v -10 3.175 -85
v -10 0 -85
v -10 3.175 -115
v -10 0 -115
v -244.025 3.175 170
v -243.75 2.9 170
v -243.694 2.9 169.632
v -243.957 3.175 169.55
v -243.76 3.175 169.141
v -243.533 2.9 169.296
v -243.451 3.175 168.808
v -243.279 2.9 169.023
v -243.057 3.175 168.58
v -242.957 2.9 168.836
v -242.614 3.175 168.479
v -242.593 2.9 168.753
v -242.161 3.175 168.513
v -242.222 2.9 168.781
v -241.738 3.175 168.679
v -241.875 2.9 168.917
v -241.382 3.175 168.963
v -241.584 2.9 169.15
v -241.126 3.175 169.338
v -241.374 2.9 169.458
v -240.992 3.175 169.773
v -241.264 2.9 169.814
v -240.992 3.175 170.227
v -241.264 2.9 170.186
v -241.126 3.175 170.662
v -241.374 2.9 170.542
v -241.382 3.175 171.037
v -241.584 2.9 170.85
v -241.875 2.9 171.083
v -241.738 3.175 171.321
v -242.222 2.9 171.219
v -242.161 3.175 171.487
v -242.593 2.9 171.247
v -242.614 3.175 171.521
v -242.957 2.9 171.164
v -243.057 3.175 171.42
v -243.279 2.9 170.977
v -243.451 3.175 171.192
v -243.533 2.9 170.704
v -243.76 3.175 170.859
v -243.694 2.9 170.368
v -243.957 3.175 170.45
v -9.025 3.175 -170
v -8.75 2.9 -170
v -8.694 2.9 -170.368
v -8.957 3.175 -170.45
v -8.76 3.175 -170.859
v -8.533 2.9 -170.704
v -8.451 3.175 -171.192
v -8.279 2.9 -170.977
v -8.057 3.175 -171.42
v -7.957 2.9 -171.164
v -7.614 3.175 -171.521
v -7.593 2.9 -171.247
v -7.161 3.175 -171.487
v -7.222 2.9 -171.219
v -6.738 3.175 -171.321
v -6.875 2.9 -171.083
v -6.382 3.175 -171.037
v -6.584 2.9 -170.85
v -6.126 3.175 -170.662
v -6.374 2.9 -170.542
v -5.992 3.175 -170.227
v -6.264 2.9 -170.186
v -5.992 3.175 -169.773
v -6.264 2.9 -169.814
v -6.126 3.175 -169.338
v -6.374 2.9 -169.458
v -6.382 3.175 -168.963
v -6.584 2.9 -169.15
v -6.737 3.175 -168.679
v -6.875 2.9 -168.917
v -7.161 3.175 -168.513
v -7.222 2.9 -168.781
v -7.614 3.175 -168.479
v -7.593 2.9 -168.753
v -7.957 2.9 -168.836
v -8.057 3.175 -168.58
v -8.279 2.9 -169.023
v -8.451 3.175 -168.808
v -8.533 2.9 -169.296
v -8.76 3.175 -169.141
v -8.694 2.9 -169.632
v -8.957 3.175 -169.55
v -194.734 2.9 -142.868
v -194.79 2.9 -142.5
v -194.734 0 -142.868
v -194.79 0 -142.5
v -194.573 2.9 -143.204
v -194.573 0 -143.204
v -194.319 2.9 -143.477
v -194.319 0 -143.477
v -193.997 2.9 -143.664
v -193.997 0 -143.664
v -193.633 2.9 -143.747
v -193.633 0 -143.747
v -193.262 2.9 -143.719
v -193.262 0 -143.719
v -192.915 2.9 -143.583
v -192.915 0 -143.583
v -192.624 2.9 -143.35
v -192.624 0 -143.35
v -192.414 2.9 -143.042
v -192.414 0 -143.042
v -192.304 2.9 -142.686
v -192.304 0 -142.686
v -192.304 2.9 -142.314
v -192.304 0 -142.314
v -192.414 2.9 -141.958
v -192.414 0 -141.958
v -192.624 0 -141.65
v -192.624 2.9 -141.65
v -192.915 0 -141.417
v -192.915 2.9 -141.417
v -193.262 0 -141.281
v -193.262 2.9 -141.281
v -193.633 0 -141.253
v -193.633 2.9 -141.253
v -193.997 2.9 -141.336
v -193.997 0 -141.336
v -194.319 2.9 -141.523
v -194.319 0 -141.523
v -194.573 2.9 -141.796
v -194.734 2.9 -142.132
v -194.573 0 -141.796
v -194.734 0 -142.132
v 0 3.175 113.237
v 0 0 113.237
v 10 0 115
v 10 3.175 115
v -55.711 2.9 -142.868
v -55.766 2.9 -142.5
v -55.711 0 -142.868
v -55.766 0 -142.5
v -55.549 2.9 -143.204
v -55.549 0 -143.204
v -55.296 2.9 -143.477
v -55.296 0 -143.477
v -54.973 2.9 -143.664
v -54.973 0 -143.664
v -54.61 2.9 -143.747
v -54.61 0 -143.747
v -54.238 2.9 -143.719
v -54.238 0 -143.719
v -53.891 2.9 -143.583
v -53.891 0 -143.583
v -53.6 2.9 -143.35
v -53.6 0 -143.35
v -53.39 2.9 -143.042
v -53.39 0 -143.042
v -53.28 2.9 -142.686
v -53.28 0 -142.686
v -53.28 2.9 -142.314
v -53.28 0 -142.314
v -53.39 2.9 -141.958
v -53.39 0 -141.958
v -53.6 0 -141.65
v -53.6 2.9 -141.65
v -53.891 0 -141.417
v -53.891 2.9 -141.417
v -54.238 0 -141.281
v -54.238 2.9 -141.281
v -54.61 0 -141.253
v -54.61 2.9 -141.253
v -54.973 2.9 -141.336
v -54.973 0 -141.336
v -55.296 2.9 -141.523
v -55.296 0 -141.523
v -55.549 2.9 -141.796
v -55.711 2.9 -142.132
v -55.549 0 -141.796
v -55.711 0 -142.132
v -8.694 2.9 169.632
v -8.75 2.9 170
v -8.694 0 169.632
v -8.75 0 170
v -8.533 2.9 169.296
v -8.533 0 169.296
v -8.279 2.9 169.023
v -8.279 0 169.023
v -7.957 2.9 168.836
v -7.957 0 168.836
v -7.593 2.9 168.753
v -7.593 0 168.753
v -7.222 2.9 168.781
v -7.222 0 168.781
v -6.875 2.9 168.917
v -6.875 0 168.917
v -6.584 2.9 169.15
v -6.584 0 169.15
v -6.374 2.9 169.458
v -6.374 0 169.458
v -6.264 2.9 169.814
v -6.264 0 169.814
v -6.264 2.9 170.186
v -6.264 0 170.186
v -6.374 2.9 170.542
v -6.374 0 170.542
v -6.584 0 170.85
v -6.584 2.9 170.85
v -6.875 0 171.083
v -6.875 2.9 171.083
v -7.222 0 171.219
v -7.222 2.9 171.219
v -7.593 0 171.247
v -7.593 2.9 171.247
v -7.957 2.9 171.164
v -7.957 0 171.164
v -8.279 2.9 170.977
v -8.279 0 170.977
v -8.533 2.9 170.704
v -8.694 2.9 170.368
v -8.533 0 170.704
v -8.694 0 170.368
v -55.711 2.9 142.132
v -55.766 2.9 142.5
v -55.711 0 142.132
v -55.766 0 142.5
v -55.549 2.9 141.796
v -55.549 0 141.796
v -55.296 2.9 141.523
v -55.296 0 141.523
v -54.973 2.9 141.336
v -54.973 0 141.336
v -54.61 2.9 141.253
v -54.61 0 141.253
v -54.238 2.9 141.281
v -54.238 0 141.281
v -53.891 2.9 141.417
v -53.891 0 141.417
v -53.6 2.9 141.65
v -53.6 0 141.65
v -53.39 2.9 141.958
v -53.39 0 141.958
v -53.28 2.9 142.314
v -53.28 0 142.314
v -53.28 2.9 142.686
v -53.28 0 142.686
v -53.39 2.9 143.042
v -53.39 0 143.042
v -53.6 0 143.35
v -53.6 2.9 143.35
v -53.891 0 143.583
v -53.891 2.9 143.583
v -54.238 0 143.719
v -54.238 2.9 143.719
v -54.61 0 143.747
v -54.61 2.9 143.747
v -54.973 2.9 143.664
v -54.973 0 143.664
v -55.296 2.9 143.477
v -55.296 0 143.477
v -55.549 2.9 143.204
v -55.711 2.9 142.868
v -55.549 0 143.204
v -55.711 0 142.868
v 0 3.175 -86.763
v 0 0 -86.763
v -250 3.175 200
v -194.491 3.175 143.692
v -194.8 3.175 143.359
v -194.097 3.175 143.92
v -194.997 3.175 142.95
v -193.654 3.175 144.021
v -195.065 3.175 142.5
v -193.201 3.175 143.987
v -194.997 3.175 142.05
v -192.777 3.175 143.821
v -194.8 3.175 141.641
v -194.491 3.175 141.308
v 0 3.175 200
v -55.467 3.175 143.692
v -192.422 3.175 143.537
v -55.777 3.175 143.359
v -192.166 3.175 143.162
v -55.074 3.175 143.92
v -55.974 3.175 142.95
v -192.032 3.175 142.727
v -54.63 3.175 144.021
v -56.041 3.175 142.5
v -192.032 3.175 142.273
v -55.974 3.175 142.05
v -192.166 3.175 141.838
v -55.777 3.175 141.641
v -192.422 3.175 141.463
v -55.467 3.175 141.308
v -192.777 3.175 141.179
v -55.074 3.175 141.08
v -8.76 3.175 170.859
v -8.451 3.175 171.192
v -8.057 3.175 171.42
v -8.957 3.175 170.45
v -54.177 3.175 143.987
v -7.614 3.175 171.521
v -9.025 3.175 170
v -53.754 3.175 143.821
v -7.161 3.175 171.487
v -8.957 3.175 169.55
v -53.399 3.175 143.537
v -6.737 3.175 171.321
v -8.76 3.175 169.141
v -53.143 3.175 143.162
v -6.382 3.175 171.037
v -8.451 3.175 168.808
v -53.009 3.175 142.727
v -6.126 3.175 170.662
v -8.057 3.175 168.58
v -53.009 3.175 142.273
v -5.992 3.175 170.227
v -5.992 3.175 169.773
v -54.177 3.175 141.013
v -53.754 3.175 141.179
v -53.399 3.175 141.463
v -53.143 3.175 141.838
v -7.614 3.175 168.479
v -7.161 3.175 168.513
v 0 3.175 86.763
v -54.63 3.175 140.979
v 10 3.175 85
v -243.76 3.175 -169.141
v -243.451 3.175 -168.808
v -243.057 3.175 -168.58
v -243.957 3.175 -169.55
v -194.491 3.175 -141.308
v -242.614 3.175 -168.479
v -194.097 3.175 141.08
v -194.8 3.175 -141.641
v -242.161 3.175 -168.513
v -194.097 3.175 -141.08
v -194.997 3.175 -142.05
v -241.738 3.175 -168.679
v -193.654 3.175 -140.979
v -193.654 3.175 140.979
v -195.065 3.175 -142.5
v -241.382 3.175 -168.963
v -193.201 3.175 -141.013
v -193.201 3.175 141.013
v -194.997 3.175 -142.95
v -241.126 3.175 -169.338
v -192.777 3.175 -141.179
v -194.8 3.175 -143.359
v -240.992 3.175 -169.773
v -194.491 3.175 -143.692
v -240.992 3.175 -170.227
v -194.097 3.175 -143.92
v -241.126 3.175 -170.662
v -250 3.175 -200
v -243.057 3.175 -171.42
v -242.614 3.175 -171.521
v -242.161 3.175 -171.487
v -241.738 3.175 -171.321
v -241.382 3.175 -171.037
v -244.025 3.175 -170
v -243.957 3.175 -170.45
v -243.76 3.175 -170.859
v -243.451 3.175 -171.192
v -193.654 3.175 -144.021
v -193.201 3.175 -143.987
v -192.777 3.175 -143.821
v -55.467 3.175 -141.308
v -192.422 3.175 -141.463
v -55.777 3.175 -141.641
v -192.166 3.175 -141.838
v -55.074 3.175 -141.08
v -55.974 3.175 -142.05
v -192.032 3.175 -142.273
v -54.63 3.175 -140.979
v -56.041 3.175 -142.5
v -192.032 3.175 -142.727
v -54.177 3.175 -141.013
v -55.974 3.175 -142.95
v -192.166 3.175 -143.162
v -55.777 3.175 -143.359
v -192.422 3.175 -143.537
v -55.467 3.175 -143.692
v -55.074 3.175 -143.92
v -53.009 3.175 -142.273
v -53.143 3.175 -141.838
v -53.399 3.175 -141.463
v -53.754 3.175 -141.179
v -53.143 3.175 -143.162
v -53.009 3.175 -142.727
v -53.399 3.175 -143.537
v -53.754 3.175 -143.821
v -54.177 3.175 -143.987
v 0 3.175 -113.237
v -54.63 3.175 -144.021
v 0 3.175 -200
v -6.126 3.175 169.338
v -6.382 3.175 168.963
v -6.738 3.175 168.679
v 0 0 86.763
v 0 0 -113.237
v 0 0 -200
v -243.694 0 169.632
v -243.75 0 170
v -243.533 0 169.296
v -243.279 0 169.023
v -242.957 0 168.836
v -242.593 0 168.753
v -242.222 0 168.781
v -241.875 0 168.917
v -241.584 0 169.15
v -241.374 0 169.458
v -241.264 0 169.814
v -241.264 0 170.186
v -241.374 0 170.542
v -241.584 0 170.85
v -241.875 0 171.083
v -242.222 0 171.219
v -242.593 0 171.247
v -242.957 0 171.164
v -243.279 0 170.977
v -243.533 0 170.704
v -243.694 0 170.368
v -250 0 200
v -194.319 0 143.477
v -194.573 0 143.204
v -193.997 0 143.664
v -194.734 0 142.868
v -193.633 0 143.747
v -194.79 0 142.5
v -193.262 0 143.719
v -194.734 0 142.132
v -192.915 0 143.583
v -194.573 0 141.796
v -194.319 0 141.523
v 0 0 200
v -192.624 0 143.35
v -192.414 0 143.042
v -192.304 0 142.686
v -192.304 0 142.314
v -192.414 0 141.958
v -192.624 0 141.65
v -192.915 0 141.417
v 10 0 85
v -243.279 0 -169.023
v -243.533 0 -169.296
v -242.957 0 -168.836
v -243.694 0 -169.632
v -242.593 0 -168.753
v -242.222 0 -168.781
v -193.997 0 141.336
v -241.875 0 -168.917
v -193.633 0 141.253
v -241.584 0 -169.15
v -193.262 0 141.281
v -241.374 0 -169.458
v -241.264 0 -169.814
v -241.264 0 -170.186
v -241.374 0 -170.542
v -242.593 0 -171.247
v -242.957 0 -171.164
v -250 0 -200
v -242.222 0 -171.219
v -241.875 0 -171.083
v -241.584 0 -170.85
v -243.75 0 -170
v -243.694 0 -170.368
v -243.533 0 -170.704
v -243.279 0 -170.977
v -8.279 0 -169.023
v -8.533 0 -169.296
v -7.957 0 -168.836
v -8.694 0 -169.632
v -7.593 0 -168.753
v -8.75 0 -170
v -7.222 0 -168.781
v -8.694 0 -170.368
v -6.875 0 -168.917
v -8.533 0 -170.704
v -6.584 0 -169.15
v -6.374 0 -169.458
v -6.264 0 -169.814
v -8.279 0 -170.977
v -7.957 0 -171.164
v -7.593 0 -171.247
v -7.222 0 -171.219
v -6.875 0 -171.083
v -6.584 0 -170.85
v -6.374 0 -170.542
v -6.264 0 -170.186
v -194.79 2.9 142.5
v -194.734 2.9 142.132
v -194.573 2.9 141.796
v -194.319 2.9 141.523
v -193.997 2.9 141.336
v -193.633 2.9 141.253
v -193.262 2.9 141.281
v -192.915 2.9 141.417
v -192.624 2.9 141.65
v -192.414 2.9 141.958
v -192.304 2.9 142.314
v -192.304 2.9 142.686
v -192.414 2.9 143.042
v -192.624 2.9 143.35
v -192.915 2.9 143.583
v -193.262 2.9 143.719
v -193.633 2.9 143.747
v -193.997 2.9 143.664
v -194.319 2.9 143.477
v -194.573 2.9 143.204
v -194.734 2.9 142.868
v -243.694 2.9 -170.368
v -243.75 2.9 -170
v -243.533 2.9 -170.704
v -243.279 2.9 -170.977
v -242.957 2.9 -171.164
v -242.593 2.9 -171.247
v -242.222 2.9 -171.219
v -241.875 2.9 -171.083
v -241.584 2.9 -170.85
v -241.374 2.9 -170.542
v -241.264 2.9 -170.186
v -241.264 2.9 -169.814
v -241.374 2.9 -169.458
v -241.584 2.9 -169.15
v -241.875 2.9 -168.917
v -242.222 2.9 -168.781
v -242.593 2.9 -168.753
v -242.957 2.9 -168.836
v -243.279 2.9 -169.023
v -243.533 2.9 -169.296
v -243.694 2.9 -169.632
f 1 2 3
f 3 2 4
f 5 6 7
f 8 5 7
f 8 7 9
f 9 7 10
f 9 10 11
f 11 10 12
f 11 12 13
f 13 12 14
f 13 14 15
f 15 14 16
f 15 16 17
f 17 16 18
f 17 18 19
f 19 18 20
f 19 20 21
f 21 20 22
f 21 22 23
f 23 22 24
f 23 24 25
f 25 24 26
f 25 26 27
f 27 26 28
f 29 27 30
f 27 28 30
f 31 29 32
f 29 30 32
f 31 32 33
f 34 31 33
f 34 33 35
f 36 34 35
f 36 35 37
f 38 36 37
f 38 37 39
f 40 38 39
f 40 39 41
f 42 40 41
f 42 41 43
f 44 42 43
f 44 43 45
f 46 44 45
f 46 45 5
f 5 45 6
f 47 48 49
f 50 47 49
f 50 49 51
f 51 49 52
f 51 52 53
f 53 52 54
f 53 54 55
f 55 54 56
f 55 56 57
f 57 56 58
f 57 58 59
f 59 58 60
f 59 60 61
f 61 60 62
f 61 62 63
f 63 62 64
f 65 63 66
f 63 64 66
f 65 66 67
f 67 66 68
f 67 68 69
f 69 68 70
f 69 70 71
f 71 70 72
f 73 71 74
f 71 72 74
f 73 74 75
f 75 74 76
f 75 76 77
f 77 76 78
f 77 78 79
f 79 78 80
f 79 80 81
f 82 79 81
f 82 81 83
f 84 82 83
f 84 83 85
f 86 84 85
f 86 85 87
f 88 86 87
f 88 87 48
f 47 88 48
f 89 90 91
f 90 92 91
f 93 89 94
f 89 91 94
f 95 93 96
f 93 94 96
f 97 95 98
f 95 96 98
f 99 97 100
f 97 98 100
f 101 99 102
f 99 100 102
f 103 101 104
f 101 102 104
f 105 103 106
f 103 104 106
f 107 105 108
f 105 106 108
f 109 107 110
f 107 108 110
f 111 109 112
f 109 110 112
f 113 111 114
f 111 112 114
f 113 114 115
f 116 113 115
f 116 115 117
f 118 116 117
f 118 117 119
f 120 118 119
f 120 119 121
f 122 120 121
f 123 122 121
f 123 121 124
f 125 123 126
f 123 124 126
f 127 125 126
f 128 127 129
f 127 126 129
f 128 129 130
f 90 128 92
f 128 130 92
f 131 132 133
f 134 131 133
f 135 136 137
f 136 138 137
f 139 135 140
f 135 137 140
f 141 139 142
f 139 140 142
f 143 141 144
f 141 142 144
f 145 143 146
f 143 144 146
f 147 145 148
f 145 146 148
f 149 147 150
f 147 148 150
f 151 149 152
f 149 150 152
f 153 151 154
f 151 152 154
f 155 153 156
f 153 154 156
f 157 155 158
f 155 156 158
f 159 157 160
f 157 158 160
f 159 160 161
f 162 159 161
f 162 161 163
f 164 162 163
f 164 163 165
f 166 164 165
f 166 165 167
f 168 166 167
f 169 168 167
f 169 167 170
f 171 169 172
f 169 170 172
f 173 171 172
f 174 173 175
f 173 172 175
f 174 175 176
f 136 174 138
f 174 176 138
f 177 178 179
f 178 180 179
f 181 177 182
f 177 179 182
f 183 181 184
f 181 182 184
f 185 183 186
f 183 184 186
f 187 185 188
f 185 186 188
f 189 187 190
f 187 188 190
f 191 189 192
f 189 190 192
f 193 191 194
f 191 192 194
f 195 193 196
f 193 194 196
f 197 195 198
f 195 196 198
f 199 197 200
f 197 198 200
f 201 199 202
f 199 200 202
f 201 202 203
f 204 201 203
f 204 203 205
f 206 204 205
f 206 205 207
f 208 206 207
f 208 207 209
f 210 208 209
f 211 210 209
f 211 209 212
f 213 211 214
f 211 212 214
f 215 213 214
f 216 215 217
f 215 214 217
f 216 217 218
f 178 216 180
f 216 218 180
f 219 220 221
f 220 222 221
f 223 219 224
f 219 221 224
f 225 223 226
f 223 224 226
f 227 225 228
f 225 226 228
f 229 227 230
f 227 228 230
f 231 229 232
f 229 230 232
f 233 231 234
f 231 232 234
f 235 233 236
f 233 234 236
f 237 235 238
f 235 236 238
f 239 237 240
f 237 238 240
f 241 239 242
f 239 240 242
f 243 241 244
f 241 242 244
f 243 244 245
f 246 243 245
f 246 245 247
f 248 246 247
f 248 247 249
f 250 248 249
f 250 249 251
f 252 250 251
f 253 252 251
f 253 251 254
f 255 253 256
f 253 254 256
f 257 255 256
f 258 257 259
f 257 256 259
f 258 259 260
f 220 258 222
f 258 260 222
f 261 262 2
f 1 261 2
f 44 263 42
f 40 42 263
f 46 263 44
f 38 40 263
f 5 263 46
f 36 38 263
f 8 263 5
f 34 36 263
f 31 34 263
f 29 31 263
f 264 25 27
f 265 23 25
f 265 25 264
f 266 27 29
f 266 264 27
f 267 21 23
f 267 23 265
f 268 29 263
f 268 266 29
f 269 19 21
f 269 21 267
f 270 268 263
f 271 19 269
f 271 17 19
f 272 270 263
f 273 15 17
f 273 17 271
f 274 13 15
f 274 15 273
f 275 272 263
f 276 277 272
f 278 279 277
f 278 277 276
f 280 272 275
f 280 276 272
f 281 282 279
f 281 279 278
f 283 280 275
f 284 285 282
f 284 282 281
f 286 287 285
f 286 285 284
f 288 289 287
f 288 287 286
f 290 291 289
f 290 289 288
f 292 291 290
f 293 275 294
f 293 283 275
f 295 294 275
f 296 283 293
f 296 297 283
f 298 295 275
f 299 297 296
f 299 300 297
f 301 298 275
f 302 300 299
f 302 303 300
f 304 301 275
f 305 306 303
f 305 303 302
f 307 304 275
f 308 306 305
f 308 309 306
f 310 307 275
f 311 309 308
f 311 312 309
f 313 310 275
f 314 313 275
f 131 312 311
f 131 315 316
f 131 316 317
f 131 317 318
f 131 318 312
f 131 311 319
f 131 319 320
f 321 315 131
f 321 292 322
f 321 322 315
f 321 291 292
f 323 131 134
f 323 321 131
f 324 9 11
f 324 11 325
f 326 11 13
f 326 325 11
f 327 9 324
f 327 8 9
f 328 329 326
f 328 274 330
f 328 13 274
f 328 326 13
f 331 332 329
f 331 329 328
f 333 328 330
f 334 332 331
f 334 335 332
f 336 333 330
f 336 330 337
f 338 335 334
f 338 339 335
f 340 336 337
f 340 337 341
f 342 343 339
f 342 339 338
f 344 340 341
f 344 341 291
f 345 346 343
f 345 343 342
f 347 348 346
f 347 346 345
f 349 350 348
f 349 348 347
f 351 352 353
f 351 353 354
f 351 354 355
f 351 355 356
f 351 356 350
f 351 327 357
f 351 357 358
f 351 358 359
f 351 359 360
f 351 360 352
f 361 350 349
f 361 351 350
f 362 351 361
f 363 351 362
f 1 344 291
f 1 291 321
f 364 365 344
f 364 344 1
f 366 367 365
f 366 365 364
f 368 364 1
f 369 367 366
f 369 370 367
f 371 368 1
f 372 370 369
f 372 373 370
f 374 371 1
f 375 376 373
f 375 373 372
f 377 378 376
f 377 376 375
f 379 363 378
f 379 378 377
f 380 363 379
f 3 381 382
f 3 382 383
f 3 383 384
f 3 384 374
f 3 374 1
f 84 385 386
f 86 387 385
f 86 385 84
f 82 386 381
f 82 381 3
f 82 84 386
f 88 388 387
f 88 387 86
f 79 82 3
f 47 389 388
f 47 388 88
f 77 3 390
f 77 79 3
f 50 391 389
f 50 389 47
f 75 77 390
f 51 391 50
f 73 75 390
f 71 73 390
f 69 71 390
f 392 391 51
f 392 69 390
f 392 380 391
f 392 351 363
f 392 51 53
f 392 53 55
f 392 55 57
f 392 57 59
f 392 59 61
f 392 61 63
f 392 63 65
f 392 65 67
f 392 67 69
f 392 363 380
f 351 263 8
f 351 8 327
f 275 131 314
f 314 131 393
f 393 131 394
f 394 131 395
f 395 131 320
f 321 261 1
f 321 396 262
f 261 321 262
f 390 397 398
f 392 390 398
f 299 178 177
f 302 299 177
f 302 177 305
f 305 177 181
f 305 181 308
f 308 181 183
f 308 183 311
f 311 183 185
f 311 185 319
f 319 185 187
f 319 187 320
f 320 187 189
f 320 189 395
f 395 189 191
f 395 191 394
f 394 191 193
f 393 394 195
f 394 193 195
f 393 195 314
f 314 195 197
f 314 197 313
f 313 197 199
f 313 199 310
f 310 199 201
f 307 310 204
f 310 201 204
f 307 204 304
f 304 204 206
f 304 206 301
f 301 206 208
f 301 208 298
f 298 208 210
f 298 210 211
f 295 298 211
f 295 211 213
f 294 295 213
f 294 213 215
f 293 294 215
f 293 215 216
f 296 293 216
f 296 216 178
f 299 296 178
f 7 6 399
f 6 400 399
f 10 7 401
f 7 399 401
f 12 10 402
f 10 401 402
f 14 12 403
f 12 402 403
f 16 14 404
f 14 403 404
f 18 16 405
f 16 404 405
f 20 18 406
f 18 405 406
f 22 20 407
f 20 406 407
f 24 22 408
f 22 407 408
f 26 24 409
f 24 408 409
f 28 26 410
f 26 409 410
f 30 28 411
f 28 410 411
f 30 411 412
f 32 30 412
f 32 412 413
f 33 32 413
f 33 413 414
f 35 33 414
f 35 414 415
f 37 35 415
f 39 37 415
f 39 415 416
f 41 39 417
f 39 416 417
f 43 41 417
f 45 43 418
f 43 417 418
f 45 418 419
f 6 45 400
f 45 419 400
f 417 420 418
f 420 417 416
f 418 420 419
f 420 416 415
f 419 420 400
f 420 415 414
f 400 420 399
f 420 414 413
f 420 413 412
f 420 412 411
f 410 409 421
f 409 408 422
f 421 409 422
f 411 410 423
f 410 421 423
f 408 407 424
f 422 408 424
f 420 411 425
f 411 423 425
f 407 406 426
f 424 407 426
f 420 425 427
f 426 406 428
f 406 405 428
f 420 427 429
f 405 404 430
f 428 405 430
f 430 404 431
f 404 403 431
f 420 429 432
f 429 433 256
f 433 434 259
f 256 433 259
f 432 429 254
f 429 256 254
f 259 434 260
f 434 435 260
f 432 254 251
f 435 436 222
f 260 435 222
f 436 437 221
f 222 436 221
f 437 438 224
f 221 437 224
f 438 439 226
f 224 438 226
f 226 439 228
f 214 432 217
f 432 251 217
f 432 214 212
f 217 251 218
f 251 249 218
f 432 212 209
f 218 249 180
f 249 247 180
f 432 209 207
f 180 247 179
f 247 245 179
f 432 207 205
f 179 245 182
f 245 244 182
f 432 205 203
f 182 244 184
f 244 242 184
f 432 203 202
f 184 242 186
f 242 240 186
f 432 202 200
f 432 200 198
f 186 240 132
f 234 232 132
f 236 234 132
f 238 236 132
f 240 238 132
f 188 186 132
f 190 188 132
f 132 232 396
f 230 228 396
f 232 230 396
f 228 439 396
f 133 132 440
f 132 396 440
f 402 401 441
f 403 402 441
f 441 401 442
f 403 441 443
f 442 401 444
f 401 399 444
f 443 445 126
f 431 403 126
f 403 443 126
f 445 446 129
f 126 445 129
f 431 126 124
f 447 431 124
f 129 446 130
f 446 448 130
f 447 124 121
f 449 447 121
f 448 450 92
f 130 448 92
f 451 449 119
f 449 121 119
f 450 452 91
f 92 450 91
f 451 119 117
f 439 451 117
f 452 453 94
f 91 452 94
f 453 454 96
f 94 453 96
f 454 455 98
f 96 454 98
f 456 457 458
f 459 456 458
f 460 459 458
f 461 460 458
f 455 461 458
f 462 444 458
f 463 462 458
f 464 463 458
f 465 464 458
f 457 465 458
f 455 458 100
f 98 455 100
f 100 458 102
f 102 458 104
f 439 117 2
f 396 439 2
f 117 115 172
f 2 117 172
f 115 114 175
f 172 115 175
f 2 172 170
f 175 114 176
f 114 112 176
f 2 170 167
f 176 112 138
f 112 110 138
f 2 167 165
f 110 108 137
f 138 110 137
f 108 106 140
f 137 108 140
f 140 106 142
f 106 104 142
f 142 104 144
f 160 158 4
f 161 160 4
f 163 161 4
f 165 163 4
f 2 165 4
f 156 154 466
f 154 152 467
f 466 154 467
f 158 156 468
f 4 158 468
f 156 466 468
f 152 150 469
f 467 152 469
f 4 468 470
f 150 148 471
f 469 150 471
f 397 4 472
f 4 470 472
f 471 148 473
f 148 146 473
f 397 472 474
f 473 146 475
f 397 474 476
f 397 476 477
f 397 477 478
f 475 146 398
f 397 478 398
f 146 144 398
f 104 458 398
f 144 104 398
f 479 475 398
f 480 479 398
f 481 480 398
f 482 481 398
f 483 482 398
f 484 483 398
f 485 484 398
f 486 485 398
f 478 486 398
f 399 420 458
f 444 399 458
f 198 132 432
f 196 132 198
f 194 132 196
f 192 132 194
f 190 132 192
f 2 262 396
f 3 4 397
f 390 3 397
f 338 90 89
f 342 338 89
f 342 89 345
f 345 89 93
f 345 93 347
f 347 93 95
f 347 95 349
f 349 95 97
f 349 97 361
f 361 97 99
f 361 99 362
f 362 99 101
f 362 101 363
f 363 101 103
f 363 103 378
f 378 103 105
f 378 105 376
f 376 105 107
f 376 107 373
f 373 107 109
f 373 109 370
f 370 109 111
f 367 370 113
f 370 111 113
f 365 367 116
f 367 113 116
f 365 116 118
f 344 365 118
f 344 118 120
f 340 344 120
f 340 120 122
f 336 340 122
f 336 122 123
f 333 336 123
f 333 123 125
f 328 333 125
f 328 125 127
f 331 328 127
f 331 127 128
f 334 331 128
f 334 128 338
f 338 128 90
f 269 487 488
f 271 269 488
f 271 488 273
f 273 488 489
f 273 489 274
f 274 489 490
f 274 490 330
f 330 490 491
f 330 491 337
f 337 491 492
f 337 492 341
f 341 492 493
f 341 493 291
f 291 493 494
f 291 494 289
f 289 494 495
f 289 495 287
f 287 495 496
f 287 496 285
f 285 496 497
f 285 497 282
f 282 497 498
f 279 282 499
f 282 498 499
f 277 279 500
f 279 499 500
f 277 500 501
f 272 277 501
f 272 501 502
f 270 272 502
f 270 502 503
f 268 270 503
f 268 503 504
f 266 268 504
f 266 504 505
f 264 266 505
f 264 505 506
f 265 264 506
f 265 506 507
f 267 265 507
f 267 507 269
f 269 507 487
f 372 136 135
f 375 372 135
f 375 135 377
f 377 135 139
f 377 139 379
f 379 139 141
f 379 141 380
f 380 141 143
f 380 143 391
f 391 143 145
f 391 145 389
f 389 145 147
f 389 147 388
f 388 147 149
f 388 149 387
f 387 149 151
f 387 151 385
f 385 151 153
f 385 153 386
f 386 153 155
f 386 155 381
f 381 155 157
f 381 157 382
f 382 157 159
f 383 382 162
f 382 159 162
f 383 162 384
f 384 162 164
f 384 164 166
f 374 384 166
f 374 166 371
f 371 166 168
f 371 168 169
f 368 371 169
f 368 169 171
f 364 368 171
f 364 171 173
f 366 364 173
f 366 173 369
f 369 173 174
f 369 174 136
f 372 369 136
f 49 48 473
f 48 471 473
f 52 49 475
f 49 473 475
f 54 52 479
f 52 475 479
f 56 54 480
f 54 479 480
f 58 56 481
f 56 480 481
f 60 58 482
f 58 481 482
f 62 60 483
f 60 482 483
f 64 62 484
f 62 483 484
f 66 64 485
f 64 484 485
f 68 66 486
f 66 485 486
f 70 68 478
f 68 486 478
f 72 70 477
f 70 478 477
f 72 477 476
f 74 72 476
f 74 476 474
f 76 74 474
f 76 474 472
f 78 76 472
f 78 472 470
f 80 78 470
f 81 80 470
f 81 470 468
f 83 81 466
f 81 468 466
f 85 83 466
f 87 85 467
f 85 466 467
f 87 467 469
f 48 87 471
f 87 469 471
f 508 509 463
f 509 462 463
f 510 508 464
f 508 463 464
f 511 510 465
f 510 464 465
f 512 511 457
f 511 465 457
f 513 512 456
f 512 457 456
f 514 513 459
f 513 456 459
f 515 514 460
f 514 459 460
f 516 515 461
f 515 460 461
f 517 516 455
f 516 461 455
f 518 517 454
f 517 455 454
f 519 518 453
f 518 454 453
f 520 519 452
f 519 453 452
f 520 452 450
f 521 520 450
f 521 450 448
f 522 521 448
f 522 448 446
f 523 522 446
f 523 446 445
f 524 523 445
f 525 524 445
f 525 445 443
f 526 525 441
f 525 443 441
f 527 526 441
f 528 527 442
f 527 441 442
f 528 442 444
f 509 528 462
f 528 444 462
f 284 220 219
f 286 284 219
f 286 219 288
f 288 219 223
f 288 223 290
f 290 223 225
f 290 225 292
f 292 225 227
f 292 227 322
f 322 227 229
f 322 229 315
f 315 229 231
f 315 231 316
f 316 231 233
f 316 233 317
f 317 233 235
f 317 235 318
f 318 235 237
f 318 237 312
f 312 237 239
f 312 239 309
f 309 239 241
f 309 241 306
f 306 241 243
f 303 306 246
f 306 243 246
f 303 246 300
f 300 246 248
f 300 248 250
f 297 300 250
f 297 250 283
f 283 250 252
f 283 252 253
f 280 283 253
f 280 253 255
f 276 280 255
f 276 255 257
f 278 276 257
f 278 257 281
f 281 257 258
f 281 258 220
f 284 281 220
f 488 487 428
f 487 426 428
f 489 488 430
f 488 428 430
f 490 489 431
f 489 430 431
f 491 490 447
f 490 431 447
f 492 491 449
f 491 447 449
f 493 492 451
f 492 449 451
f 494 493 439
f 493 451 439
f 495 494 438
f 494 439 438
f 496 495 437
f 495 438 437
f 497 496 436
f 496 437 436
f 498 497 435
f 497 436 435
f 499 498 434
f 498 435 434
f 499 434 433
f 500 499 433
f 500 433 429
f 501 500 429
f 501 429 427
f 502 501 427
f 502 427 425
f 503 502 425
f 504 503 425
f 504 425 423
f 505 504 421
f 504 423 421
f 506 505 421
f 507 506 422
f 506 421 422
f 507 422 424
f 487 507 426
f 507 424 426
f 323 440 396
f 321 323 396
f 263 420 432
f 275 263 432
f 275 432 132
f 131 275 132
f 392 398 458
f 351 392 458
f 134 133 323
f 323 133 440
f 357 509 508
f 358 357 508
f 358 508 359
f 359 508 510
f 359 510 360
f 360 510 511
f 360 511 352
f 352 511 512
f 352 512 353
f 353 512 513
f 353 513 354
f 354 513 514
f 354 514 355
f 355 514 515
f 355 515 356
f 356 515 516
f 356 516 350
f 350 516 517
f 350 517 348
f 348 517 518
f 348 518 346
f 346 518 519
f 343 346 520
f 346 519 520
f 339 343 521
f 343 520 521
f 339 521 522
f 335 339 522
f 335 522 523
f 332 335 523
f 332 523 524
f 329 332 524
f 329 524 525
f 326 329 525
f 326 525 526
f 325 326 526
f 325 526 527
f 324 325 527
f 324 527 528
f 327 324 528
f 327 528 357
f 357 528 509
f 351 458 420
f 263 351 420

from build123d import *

# Parameters (mm, degrees)
BOSS_EXTRUDE1_DEPTH             = 3.175
M3X0_5_TAPPED_HOLE1_D           = 2.5
M3X0_5_TAPPED_HOLE1_CSINK_D     = 3.05
M3X0_5_TAPPED_HOLE1_CSINK_ANGLE = 90


with BuildPart() as part:
    # Sketch1 → Boss-Extrude1 (new body)
    with BuildSketch(Plane(origin=(0, 0, 0), x_dir=(1, 0, 0), z_dir=(0, 1, 0))):
        Polygon((0, 86.763269807), (-10, 85), (-10, 115), (0, 113.236730193), (0, 200), (-250, 200), (-250, -200), (0, -200), (0, -113.236730193), (10, -115), (10, -85), (0, -86.763269807), align=None)
    extrude(amount=BOSS_EXTRUDE1_DEPTH)

    # M3x0.5 Tapped Hole1 (through all)
    with Locations(Plane(origin=(0, 3.175, 0), x_dir=(1, 0, 0), z_dir=(0, 1, 0))):
        with Locations((-193.539921074, 142.5), (-193.539921074, -142.5), (-54.516495305, 142.5), (-54.516495305, -142.5), (-242.5, -170), (-242.5, 170), (-7.5, -170), (-7.5, 170)):
            CounterSinkHole(M3X0_5_TAPPED_HOLE1_D / 2, M3X0_5_TAPPED_HOLE1_CSINK_D / 2, counter_sink_angle=M3X0_5_TAPPED_HOLE1_CSINK_ANGLE)


solid = part.part
